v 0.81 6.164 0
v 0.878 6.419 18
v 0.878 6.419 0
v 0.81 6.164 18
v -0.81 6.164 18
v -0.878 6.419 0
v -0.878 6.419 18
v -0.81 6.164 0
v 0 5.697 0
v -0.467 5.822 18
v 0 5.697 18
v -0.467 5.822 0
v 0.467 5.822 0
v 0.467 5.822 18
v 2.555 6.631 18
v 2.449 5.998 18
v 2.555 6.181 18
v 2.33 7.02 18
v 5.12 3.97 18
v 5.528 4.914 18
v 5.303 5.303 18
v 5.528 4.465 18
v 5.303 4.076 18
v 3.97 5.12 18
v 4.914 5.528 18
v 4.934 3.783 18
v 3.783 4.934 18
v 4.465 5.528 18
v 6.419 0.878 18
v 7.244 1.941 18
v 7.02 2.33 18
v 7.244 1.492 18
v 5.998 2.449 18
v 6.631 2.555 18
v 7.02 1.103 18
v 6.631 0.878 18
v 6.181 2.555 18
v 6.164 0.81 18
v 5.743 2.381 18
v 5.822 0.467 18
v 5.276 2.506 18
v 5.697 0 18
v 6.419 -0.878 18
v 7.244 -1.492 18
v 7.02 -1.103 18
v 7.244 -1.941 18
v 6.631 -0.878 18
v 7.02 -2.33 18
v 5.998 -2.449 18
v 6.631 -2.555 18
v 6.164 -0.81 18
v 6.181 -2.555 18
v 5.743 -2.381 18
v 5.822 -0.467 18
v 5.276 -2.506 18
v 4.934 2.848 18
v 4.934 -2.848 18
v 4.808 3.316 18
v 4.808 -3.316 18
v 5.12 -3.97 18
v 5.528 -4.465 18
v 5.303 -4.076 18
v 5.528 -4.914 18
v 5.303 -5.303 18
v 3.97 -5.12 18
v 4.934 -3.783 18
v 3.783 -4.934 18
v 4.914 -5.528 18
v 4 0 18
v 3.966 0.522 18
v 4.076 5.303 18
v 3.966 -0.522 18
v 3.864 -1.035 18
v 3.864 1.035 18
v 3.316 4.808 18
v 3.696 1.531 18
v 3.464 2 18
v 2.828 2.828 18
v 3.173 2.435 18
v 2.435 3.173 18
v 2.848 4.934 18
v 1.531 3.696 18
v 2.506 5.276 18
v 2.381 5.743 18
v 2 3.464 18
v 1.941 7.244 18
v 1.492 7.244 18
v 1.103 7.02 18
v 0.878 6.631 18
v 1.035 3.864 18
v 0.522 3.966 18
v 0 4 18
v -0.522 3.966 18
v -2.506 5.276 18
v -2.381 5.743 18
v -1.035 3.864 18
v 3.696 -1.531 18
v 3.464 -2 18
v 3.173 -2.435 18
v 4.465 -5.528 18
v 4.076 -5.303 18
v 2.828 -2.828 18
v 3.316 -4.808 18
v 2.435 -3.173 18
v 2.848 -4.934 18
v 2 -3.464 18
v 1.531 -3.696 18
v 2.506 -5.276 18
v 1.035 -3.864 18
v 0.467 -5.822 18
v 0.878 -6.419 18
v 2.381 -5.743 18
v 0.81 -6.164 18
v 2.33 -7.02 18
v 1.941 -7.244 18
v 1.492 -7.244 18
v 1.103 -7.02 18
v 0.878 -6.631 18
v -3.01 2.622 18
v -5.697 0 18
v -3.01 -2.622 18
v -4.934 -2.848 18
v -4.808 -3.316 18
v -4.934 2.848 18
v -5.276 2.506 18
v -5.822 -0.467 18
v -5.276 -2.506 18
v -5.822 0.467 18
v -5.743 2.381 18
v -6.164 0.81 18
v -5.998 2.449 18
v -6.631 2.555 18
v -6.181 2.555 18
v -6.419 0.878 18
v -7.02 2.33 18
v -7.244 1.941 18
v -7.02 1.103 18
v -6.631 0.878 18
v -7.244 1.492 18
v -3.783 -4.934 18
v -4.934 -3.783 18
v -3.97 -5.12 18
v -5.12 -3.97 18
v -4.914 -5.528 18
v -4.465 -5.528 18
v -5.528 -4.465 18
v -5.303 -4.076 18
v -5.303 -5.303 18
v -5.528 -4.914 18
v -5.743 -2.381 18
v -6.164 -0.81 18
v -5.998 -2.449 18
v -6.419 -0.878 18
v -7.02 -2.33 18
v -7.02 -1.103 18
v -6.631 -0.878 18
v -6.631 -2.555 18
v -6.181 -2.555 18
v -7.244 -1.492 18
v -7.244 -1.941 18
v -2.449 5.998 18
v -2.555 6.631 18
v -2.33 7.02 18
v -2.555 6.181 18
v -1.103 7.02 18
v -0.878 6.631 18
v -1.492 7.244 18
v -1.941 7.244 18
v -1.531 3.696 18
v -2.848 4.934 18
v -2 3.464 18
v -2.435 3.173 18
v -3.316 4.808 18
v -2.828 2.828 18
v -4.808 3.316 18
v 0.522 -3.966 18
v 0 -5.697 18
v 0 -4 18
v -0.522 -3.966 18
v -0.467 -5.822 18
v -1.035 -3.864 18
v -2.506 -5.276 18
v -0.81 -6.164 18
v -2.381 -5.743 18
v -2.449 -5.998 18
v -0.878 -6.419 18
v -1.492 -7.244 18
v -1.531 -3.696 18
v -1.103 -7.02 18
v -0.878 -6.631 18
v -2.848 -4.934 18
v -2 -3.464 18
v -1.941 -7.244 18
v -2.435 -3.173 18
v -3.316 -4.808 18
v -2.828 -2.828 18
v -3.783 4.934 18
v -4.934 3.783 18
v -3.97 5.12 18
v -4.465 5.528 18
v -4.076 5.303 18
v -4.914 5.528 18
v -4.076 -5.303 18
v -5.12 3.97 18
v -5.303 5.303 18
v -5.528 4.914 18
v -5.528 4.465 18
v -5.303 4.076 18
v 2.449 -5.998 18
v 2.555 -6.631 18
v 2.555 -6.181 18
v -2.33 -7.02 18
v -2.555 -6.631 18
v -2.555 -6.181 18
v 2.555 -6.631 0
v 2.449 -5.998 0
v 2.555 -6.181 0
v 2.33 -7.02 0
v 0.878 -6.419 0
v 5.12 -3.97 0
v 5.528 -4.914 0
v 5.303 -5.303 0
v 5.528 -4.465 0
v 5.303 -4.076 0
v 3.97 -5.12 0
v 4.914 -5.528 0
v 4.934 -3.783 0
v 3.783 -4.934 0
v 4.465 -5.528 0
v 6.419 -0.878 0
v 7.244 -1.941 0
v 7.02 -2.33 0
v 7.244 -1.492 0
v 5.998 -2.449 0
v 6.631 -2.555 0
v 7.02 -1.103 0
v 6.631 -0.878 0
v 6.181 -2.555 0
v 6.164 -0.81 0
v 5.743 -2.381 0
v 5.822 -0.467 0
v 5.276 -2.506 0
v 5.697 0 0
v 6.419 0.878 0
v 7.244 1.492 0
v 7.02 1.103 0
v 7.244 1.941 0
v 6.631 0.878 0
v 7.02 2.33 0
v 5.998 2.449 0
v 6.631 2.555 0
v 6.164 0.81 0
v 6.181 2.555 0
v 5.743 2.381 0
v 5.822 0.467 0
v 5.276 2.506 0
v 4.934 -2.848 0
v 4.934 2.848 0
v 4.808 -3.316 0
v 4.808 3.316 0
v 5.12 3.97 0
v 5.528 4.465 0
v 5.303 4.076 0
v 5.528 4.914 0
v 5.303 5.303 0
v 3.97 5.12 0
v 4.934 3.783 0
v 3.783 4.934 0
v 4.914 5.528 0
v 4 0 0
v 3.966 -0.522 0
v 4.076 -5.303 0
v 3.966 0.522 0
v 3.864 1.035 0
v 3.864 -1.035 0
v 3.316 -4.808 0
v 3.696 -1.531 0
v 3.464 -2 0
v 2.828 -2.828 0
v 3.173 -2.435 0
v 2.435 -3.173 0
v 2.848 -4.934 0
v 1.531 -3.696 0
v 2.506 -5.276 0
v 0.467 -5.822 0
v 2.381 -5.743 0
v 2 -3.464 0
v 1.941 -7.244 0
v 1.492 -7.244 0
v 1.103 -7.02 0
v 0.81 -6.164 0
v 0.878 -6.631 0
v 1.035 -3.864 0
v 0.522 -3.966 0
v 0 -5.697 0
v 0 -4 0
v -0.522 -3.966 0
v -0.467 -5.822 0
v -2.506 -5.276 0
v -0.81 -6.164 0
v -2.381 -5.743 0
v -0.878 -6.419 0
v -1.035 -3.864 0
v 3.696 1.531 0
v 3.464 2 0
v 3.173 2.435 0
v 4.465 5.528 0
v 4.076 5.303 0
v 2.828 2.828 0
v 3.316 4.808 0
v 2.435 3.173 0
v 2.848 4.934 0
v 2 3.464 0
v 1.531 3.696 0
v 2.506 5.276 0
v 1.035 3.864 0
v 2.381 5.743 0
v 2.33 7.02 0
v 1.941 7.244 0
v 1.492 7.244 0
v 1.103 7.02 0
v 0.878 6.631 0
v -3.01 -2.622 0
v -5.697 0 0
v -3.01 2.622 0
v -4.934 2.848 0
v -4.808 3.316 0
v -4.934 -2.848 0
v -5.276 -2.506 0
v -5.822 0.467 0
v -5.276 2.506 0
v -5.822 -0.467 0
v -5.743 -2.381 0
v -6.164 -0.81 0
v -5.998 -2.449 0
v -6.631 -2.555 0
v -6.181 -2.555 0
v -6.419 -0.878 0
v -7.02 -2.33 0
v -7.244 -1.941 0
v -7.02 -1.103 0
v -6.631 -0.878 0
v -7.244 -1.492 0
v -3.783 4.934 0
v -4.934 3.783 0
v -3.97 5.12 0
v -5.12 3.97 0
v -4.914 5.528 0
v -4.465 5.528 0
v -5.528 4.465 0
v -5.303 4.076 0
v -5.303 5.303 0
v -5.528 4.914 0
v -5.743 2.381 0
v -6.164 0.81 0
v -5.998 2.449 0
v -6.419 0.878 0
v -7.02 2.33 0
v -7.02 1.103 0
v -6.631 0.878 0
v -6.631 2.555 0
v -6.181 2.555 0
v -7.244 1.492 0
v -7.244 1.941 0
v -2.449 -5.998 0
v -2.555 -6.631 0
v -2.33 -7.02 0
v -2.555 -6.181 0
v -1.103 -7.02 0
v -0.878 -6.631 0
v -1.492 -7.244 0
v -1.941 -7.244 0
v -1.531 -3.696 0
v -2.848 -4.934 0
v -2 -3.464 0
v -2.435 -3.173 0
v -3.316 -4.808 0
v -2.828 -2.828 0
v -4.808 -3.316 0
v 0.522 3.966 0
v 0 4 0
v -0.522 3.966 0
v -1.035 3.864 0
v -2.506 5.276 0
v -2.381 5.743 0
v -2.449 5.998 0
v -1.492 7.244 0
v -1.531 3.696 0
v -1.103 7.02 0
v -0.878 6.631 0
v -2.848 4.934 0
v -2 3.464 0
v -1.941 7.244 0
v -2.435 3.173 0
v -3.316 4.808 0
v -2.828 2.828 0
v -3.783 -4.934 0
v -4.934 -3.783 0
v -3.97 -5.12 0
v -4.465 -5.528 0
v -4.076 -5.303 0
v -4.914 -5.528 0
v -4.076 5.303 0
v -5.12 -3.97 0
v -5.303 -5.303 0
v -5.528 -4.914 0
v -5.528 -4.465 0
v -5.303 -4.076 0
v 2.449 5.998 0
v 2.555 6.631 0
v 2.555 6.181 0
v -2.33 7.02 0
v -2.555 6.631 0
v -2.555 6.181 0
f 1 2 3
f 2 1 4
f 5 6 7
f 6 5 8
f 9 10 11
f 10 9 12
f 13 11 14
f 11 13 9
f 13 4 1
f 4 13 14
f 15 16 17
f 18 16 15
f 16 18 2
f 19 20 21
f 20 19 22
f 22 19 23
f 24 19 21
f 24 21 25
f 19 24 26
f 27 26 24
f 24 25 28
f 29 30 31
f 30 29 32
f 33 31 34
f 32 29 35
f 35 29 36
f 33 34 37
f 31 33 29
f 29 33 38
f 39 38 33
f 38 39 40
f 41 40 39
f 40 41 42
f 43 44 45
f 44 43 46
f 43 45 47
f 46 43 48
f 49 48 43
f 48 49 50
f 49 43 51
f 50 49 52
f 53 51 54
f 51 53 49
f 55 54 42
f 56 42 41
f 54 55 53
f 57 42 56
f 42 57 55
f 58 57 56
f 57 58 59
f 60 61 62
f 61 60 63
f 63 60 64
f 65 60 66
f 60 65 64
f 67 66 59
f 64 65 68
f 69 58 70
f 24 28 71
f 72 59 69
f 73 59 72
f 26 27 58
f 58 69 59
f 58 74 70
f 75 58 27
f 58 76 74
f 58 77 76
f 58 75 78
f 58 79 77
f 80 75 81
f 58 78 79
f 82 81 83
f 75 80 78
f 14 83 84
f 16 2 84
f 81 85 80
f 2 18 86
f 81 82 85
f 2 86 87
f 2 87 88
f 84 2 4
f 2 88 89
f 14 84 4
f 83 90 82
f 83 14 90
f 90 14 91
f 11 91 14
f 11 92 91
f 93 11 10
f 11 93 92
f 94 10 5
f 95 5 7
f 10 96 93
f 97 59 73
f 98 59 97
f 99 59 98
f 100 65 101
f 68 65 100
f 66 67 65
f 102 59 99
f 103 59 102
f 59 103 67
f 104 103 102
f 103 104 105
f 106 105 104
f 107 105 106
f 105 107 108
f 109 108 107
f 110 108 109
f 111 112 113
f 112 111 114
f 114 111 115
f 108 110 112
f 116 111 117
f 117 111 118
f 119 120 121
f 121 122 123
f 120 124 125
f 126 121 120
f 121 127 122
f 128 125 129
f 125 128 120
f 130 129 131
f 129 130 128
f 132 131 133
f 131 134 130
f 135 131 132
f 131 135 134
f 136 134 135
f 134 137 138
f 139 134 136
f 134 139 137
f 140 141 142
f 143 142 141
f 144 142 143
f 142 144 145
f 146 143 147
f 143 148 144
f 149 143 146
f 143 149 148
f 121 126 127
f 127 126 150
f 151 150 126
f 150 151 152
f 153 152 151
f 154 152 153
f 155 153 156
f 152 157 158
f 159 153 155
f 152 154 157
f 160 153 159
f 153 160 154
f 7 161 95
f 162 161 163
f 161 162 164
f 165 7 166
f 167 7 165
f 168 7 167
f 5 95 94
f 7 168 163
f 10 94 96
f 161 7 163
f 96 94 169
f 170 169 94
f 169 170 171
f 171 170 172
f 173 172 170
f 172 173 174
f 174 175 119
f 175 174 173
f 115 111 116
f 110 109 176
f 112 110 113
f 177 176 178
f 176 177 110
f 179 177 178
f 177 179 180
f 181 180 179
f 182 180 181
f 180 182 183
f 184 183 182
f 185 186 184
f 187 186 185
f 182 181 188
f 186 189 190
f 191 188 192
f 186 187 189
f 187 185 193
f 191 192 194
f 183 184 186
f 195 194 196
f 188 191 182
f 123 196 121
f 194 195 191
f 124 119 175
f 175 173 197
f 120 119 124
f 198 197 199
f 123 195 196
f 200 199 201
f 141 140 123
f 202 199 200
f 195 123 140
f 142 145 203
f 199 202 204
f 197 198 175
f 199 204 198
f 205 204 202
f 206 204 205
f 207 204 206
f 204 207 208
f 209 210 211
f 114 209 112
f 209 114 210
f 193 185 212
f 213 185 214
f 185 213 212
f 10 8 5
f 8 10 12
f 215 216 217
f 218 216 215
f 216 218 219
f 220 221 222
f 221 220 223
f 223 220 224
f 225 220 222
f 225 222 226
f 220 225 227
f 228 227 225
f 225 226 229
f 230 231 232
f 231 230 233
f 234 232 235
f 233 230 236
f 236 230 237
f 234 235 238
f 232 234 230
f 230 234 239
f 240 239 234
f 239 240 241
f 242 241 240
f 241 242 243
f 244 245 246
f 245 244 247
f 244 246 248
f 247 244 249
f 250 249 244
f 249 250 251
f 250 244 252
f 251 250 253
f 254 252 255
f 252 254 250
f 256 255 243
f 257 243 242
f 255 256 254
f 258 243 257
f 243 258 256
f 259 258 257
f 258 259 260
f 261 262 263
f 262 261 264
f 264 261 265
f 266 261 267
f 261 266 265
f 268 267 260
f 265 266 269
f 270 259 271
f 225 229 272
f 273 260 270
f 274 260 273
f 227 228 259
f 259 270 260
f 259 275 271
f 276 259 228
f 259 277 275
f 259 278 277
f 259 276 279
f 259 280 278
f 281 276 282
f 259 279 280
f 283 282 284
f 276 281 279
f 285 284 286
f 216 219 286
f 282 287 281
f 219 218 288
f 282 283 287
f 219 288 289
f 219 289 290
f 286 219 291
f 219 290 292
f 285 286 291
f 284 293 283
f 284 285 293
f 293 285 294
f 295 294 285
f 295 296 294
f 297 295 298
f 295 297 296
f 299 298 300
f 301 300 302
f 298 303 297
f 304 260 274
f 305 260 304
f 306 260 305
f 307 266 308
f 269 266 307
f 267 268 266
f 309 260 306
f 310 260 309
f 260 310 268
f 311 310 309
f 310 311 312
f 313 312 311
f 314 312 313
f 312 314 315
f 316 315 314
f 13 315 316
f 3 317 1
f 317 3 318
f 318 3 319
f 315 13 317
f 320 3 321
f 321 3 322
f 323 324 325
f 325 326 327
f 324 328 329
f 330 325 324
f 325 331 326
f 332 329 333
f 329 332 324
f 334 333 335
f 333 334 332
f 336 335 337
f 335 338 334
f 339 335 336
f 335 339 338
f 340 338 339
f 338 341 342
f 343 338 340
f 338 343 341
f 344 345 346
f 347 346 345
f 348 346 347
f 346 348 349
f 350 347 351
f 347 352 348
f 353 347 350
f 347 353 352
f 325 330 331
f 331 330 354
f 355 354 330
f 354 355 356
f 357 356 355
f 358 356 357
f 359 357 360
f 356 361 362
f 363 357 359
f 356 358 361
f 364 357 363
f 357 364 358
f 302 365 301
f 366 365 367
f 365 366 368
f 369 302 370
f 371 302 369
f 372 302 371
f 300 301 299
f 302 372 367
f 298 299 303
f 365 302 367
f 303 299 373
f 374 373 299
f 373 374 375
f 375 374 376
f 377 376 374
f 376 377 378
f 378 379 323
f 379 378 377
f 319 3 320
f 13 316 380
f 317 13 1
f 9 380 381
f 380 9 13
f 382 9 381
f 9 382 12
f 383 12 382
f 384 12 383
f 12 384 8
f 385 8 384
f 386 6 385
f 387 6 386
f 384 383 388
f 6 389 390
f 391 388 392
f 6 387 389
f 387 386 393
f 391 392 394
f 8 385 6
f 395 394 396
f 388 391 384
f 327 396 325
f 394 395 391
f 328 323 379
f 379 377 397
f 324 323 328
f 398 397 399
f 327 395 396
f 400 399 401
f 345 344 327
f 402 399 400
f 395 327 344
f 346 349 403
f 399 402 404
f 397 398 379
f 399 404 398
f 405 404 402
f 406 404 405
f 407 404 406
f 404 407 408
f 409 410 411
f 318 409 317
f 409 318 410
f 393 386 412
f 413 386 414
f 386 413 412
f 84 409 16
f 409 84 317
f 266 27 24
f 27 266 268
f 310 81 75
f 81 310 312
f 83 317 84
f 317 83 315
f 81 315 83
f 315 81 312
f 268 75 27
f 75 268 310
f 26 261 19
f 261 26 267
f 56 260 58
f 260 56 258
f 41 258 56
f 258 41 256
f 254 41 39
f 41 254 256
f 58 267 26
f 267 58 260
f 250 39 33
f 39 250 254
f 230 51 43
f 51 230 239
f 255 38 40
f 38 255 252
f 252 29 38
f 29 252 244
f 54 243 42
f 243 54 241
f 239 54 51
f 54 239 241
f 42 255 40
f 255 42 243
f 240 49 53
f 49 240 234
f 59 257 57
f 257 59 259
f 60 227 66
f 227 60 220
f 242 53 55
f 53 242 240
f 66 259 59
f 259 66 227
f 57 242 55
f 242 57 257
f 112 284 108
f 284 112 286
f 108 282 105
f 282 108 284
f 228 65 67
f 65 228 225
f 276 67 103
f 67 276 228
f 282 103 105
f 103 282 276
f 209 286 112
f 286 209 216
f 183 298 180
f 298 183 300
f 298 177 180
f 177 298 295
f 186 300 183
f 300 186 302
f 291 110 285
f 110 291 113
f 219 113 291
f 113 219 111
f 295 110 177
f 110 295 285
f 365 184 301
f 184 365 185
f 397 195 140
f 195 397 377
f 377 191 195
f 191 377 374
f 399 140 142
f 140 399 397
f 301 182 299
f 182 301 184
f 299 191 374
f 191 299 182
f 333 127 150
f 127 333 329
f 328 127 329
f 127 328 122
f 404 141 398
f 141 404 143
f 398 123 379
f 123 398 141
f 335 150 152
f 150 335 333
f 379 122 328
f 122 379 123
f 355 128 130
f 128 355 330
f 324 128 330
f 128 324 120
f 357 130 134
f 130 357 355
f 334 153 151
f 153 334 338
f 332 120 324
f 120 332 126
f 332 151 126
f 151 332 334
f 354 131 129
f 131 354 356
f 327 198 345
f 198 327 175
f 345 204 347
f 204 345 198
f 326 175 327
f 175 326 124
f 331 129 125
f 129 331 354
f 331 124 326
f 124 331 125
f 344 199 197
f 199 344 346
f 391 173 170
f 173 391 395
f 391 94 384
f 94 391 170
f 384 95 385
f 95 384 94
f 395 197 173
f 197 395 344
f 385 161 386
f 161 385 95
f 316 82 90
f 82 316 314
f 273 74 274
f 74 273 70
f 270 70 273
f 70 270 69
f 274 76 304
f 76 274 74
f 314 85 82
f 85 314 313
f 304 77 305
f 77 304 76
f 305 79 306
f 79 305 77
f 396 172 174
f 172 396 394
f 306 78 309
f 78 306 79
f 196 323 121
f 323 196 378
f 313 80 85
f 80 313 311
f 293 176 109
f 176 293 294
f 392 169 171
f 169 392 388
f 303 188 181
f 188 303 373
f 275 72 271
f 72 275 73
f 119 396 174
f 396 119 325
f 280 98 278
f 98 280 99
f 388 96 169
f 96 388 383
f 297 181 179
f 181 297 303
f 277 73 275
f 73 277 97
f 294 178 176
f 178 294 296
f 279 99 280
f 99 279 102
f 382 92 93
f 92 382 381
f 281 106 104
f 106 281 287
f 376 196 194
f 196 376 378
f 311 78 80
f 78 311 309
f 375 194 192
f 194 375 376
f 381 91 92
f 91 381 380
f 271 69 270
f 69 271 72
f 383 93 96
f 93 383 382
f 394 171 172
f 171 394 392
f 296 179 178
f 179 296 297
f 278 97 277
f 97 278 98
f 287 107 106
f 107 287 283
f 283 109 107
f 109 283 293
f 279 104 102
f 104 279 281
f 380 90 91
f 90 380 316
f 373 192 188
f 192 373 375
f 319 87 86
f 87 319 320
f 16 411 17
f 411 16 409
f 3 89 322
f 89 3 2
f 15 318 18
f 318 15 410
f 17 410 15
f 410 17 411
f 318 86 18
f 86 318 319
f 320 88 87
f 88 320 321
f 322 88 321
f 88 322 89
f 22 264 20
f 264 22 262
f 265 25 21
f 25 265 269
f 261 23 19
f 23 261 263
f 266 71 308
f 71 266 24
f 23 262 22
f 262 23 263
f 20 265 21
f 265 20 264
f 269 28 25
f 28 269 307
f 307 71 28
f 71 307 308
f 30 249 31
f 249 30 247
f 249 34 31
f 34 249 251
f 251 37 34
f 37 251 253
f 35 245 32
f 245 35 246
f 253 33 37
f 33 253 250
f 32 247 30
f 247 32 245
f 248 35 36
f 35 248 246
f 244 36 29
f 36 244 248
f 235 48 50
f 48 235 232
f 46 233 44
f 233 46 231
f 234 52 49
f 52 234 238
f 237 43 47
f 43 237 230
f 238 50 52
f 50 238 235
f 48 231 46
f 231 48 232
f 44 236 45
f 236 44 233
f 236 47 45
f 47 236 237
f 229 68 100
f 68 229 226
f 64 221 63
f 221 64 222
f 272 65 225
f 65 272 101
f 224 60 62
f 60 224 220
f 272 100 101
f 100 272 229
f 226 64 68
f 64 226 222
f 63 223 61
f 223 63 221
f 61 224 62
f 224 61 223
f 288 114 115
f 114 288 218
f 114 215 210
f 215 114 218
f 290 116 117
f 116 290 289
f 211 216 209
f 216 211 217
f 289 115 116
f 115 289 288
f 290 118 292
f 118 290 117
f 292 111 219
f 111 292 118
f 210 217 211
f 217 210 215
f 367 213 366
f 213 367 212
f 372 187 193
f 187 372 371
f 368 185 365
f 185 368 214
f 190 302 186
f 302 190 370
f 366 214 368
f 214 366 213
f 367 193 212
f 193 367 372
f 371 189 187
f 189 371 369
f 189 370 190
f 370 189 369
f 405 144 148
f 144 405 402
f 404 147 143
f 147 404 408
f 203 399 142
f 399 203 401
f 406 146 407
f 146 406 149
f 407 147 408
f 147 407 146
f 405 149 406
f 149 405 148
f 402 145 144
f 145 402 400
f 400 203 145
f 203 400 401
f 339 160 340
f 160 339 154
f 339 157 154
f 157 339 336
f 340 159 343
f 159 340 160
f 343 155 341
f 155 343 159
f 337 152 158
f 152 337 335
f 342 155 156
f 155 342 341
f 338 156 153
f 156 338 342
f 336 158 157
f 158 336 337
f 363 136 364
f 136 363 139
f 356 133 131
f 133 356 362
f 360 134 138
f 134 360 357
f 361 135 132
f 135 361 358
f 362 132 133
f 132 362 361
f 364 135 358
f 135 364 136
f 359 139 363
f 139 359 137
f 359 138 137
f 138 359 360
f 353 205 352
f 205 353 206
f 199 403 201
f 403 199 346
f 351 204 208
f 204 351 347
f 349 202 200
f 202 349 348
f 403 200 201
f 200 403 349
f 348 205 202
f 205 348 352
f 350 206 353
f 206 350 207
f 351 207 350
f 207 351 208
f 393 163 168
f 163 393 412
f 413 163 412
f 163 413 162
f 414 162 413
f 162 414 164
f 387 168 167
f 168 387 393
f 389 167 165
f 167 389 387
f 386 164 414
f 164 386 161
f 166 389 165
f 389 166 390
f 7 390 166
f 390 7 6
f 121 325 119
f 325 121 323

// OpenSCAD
// Takuya Yamaguchi

// ignore variable values
//$fn=48;

//custermizing data

// number of tooth
nt =12;

//shaft diameter		
sd =8;

//gear diameter		
gd=15;

// fringe thickness		
ggdt=1.5;	

// gear hight
gh=18;

//number of fringe		
nf=0;	//[0,1,2]

//tooth shape	
$fn=12; //[4,5,6,7,8,12]

//Dcut yes or no
Dcut="yes";//[yes,no]

// ignore variable values
gpr=gd*3.14159/4/nt/(1+3.141592/nt/2);	//gear tooth r
gmr=gpr*1.077; 							// gear gap r
ggd=gd+4; 									// fringe diameter
dh=gh; 										//Dcut hight
off= 360/nt/2;  							// tooth offset

module pgear()

	union(){
	translate([0, 0, 0]) {
		difference() {
         union(){  //gear & fringe
		  translate([0, 0, 0]) cylinder(h = gh, r =gd/2-gpr,$fn=48); //gear
      if (nf == 1){
          translate([0, 0, gh-ggdt])cylinder(h = ggdt, r= ggd/2,$fn=96); //fringe
      				}
      if (nf == 2){
         translate([0, 0, gh-ggdt])cylinder(h = ggdt, r= ggd/2,$fn=96); //fringe
         translate([0, 0, 0])cylinder(h = ggdt, r= ggd/2,$fn=96); //fringe
                   }
                 }
translate([0, 0, -0.5])  // shaft 
			cylinder(h = gh+2.5, r= sd/2,$fn=48);

		for (i = [0:(nt-1)]) { 		//gear gap
			echo(360*i/nt, sin(360*i/nt)*(gd/2-gpr), cos(360*i/nt)*(gd/2-gpr));
			translate([sin(360*i/nt)*(gd/2-gpr), cos(360*i/nt)*(gd/2-gpr), ggdt*nf*(nf-1)*0.5])
				rotate([0,0,90*(1-2/$fn)-360*i/nt-($fn-1)*off]) cylinder(h = gh-ggdt*nf, r=gmr);
		                      }
     							}
		for (i = [0:(nt-1)]) {  // Gear tooth
			echo(360*i/nt+off, sin(360*i/nt+off)*(gd/2-gpr), cos(360*i/nt+off)*(gd/2-gpr));
			translate([sin(360*i/nt+off)*(gd/2-gpr), cos(360*i/nt+off)*(gd/2-gpr), 0 ])
				rotate([0,0,90*(1-2/$fn)-360*i/nt-$fn*off]) cylinder(h = gh, r=gpr);
		                      }
                }


 			
	 // Dcut
 if (Dcut== "yes"){
         translate([-(sd/2.1), 0, gh/2]) cube([sd/5,sd*0.8,dh], center = true); // Dcut
       }
}

pgear();
